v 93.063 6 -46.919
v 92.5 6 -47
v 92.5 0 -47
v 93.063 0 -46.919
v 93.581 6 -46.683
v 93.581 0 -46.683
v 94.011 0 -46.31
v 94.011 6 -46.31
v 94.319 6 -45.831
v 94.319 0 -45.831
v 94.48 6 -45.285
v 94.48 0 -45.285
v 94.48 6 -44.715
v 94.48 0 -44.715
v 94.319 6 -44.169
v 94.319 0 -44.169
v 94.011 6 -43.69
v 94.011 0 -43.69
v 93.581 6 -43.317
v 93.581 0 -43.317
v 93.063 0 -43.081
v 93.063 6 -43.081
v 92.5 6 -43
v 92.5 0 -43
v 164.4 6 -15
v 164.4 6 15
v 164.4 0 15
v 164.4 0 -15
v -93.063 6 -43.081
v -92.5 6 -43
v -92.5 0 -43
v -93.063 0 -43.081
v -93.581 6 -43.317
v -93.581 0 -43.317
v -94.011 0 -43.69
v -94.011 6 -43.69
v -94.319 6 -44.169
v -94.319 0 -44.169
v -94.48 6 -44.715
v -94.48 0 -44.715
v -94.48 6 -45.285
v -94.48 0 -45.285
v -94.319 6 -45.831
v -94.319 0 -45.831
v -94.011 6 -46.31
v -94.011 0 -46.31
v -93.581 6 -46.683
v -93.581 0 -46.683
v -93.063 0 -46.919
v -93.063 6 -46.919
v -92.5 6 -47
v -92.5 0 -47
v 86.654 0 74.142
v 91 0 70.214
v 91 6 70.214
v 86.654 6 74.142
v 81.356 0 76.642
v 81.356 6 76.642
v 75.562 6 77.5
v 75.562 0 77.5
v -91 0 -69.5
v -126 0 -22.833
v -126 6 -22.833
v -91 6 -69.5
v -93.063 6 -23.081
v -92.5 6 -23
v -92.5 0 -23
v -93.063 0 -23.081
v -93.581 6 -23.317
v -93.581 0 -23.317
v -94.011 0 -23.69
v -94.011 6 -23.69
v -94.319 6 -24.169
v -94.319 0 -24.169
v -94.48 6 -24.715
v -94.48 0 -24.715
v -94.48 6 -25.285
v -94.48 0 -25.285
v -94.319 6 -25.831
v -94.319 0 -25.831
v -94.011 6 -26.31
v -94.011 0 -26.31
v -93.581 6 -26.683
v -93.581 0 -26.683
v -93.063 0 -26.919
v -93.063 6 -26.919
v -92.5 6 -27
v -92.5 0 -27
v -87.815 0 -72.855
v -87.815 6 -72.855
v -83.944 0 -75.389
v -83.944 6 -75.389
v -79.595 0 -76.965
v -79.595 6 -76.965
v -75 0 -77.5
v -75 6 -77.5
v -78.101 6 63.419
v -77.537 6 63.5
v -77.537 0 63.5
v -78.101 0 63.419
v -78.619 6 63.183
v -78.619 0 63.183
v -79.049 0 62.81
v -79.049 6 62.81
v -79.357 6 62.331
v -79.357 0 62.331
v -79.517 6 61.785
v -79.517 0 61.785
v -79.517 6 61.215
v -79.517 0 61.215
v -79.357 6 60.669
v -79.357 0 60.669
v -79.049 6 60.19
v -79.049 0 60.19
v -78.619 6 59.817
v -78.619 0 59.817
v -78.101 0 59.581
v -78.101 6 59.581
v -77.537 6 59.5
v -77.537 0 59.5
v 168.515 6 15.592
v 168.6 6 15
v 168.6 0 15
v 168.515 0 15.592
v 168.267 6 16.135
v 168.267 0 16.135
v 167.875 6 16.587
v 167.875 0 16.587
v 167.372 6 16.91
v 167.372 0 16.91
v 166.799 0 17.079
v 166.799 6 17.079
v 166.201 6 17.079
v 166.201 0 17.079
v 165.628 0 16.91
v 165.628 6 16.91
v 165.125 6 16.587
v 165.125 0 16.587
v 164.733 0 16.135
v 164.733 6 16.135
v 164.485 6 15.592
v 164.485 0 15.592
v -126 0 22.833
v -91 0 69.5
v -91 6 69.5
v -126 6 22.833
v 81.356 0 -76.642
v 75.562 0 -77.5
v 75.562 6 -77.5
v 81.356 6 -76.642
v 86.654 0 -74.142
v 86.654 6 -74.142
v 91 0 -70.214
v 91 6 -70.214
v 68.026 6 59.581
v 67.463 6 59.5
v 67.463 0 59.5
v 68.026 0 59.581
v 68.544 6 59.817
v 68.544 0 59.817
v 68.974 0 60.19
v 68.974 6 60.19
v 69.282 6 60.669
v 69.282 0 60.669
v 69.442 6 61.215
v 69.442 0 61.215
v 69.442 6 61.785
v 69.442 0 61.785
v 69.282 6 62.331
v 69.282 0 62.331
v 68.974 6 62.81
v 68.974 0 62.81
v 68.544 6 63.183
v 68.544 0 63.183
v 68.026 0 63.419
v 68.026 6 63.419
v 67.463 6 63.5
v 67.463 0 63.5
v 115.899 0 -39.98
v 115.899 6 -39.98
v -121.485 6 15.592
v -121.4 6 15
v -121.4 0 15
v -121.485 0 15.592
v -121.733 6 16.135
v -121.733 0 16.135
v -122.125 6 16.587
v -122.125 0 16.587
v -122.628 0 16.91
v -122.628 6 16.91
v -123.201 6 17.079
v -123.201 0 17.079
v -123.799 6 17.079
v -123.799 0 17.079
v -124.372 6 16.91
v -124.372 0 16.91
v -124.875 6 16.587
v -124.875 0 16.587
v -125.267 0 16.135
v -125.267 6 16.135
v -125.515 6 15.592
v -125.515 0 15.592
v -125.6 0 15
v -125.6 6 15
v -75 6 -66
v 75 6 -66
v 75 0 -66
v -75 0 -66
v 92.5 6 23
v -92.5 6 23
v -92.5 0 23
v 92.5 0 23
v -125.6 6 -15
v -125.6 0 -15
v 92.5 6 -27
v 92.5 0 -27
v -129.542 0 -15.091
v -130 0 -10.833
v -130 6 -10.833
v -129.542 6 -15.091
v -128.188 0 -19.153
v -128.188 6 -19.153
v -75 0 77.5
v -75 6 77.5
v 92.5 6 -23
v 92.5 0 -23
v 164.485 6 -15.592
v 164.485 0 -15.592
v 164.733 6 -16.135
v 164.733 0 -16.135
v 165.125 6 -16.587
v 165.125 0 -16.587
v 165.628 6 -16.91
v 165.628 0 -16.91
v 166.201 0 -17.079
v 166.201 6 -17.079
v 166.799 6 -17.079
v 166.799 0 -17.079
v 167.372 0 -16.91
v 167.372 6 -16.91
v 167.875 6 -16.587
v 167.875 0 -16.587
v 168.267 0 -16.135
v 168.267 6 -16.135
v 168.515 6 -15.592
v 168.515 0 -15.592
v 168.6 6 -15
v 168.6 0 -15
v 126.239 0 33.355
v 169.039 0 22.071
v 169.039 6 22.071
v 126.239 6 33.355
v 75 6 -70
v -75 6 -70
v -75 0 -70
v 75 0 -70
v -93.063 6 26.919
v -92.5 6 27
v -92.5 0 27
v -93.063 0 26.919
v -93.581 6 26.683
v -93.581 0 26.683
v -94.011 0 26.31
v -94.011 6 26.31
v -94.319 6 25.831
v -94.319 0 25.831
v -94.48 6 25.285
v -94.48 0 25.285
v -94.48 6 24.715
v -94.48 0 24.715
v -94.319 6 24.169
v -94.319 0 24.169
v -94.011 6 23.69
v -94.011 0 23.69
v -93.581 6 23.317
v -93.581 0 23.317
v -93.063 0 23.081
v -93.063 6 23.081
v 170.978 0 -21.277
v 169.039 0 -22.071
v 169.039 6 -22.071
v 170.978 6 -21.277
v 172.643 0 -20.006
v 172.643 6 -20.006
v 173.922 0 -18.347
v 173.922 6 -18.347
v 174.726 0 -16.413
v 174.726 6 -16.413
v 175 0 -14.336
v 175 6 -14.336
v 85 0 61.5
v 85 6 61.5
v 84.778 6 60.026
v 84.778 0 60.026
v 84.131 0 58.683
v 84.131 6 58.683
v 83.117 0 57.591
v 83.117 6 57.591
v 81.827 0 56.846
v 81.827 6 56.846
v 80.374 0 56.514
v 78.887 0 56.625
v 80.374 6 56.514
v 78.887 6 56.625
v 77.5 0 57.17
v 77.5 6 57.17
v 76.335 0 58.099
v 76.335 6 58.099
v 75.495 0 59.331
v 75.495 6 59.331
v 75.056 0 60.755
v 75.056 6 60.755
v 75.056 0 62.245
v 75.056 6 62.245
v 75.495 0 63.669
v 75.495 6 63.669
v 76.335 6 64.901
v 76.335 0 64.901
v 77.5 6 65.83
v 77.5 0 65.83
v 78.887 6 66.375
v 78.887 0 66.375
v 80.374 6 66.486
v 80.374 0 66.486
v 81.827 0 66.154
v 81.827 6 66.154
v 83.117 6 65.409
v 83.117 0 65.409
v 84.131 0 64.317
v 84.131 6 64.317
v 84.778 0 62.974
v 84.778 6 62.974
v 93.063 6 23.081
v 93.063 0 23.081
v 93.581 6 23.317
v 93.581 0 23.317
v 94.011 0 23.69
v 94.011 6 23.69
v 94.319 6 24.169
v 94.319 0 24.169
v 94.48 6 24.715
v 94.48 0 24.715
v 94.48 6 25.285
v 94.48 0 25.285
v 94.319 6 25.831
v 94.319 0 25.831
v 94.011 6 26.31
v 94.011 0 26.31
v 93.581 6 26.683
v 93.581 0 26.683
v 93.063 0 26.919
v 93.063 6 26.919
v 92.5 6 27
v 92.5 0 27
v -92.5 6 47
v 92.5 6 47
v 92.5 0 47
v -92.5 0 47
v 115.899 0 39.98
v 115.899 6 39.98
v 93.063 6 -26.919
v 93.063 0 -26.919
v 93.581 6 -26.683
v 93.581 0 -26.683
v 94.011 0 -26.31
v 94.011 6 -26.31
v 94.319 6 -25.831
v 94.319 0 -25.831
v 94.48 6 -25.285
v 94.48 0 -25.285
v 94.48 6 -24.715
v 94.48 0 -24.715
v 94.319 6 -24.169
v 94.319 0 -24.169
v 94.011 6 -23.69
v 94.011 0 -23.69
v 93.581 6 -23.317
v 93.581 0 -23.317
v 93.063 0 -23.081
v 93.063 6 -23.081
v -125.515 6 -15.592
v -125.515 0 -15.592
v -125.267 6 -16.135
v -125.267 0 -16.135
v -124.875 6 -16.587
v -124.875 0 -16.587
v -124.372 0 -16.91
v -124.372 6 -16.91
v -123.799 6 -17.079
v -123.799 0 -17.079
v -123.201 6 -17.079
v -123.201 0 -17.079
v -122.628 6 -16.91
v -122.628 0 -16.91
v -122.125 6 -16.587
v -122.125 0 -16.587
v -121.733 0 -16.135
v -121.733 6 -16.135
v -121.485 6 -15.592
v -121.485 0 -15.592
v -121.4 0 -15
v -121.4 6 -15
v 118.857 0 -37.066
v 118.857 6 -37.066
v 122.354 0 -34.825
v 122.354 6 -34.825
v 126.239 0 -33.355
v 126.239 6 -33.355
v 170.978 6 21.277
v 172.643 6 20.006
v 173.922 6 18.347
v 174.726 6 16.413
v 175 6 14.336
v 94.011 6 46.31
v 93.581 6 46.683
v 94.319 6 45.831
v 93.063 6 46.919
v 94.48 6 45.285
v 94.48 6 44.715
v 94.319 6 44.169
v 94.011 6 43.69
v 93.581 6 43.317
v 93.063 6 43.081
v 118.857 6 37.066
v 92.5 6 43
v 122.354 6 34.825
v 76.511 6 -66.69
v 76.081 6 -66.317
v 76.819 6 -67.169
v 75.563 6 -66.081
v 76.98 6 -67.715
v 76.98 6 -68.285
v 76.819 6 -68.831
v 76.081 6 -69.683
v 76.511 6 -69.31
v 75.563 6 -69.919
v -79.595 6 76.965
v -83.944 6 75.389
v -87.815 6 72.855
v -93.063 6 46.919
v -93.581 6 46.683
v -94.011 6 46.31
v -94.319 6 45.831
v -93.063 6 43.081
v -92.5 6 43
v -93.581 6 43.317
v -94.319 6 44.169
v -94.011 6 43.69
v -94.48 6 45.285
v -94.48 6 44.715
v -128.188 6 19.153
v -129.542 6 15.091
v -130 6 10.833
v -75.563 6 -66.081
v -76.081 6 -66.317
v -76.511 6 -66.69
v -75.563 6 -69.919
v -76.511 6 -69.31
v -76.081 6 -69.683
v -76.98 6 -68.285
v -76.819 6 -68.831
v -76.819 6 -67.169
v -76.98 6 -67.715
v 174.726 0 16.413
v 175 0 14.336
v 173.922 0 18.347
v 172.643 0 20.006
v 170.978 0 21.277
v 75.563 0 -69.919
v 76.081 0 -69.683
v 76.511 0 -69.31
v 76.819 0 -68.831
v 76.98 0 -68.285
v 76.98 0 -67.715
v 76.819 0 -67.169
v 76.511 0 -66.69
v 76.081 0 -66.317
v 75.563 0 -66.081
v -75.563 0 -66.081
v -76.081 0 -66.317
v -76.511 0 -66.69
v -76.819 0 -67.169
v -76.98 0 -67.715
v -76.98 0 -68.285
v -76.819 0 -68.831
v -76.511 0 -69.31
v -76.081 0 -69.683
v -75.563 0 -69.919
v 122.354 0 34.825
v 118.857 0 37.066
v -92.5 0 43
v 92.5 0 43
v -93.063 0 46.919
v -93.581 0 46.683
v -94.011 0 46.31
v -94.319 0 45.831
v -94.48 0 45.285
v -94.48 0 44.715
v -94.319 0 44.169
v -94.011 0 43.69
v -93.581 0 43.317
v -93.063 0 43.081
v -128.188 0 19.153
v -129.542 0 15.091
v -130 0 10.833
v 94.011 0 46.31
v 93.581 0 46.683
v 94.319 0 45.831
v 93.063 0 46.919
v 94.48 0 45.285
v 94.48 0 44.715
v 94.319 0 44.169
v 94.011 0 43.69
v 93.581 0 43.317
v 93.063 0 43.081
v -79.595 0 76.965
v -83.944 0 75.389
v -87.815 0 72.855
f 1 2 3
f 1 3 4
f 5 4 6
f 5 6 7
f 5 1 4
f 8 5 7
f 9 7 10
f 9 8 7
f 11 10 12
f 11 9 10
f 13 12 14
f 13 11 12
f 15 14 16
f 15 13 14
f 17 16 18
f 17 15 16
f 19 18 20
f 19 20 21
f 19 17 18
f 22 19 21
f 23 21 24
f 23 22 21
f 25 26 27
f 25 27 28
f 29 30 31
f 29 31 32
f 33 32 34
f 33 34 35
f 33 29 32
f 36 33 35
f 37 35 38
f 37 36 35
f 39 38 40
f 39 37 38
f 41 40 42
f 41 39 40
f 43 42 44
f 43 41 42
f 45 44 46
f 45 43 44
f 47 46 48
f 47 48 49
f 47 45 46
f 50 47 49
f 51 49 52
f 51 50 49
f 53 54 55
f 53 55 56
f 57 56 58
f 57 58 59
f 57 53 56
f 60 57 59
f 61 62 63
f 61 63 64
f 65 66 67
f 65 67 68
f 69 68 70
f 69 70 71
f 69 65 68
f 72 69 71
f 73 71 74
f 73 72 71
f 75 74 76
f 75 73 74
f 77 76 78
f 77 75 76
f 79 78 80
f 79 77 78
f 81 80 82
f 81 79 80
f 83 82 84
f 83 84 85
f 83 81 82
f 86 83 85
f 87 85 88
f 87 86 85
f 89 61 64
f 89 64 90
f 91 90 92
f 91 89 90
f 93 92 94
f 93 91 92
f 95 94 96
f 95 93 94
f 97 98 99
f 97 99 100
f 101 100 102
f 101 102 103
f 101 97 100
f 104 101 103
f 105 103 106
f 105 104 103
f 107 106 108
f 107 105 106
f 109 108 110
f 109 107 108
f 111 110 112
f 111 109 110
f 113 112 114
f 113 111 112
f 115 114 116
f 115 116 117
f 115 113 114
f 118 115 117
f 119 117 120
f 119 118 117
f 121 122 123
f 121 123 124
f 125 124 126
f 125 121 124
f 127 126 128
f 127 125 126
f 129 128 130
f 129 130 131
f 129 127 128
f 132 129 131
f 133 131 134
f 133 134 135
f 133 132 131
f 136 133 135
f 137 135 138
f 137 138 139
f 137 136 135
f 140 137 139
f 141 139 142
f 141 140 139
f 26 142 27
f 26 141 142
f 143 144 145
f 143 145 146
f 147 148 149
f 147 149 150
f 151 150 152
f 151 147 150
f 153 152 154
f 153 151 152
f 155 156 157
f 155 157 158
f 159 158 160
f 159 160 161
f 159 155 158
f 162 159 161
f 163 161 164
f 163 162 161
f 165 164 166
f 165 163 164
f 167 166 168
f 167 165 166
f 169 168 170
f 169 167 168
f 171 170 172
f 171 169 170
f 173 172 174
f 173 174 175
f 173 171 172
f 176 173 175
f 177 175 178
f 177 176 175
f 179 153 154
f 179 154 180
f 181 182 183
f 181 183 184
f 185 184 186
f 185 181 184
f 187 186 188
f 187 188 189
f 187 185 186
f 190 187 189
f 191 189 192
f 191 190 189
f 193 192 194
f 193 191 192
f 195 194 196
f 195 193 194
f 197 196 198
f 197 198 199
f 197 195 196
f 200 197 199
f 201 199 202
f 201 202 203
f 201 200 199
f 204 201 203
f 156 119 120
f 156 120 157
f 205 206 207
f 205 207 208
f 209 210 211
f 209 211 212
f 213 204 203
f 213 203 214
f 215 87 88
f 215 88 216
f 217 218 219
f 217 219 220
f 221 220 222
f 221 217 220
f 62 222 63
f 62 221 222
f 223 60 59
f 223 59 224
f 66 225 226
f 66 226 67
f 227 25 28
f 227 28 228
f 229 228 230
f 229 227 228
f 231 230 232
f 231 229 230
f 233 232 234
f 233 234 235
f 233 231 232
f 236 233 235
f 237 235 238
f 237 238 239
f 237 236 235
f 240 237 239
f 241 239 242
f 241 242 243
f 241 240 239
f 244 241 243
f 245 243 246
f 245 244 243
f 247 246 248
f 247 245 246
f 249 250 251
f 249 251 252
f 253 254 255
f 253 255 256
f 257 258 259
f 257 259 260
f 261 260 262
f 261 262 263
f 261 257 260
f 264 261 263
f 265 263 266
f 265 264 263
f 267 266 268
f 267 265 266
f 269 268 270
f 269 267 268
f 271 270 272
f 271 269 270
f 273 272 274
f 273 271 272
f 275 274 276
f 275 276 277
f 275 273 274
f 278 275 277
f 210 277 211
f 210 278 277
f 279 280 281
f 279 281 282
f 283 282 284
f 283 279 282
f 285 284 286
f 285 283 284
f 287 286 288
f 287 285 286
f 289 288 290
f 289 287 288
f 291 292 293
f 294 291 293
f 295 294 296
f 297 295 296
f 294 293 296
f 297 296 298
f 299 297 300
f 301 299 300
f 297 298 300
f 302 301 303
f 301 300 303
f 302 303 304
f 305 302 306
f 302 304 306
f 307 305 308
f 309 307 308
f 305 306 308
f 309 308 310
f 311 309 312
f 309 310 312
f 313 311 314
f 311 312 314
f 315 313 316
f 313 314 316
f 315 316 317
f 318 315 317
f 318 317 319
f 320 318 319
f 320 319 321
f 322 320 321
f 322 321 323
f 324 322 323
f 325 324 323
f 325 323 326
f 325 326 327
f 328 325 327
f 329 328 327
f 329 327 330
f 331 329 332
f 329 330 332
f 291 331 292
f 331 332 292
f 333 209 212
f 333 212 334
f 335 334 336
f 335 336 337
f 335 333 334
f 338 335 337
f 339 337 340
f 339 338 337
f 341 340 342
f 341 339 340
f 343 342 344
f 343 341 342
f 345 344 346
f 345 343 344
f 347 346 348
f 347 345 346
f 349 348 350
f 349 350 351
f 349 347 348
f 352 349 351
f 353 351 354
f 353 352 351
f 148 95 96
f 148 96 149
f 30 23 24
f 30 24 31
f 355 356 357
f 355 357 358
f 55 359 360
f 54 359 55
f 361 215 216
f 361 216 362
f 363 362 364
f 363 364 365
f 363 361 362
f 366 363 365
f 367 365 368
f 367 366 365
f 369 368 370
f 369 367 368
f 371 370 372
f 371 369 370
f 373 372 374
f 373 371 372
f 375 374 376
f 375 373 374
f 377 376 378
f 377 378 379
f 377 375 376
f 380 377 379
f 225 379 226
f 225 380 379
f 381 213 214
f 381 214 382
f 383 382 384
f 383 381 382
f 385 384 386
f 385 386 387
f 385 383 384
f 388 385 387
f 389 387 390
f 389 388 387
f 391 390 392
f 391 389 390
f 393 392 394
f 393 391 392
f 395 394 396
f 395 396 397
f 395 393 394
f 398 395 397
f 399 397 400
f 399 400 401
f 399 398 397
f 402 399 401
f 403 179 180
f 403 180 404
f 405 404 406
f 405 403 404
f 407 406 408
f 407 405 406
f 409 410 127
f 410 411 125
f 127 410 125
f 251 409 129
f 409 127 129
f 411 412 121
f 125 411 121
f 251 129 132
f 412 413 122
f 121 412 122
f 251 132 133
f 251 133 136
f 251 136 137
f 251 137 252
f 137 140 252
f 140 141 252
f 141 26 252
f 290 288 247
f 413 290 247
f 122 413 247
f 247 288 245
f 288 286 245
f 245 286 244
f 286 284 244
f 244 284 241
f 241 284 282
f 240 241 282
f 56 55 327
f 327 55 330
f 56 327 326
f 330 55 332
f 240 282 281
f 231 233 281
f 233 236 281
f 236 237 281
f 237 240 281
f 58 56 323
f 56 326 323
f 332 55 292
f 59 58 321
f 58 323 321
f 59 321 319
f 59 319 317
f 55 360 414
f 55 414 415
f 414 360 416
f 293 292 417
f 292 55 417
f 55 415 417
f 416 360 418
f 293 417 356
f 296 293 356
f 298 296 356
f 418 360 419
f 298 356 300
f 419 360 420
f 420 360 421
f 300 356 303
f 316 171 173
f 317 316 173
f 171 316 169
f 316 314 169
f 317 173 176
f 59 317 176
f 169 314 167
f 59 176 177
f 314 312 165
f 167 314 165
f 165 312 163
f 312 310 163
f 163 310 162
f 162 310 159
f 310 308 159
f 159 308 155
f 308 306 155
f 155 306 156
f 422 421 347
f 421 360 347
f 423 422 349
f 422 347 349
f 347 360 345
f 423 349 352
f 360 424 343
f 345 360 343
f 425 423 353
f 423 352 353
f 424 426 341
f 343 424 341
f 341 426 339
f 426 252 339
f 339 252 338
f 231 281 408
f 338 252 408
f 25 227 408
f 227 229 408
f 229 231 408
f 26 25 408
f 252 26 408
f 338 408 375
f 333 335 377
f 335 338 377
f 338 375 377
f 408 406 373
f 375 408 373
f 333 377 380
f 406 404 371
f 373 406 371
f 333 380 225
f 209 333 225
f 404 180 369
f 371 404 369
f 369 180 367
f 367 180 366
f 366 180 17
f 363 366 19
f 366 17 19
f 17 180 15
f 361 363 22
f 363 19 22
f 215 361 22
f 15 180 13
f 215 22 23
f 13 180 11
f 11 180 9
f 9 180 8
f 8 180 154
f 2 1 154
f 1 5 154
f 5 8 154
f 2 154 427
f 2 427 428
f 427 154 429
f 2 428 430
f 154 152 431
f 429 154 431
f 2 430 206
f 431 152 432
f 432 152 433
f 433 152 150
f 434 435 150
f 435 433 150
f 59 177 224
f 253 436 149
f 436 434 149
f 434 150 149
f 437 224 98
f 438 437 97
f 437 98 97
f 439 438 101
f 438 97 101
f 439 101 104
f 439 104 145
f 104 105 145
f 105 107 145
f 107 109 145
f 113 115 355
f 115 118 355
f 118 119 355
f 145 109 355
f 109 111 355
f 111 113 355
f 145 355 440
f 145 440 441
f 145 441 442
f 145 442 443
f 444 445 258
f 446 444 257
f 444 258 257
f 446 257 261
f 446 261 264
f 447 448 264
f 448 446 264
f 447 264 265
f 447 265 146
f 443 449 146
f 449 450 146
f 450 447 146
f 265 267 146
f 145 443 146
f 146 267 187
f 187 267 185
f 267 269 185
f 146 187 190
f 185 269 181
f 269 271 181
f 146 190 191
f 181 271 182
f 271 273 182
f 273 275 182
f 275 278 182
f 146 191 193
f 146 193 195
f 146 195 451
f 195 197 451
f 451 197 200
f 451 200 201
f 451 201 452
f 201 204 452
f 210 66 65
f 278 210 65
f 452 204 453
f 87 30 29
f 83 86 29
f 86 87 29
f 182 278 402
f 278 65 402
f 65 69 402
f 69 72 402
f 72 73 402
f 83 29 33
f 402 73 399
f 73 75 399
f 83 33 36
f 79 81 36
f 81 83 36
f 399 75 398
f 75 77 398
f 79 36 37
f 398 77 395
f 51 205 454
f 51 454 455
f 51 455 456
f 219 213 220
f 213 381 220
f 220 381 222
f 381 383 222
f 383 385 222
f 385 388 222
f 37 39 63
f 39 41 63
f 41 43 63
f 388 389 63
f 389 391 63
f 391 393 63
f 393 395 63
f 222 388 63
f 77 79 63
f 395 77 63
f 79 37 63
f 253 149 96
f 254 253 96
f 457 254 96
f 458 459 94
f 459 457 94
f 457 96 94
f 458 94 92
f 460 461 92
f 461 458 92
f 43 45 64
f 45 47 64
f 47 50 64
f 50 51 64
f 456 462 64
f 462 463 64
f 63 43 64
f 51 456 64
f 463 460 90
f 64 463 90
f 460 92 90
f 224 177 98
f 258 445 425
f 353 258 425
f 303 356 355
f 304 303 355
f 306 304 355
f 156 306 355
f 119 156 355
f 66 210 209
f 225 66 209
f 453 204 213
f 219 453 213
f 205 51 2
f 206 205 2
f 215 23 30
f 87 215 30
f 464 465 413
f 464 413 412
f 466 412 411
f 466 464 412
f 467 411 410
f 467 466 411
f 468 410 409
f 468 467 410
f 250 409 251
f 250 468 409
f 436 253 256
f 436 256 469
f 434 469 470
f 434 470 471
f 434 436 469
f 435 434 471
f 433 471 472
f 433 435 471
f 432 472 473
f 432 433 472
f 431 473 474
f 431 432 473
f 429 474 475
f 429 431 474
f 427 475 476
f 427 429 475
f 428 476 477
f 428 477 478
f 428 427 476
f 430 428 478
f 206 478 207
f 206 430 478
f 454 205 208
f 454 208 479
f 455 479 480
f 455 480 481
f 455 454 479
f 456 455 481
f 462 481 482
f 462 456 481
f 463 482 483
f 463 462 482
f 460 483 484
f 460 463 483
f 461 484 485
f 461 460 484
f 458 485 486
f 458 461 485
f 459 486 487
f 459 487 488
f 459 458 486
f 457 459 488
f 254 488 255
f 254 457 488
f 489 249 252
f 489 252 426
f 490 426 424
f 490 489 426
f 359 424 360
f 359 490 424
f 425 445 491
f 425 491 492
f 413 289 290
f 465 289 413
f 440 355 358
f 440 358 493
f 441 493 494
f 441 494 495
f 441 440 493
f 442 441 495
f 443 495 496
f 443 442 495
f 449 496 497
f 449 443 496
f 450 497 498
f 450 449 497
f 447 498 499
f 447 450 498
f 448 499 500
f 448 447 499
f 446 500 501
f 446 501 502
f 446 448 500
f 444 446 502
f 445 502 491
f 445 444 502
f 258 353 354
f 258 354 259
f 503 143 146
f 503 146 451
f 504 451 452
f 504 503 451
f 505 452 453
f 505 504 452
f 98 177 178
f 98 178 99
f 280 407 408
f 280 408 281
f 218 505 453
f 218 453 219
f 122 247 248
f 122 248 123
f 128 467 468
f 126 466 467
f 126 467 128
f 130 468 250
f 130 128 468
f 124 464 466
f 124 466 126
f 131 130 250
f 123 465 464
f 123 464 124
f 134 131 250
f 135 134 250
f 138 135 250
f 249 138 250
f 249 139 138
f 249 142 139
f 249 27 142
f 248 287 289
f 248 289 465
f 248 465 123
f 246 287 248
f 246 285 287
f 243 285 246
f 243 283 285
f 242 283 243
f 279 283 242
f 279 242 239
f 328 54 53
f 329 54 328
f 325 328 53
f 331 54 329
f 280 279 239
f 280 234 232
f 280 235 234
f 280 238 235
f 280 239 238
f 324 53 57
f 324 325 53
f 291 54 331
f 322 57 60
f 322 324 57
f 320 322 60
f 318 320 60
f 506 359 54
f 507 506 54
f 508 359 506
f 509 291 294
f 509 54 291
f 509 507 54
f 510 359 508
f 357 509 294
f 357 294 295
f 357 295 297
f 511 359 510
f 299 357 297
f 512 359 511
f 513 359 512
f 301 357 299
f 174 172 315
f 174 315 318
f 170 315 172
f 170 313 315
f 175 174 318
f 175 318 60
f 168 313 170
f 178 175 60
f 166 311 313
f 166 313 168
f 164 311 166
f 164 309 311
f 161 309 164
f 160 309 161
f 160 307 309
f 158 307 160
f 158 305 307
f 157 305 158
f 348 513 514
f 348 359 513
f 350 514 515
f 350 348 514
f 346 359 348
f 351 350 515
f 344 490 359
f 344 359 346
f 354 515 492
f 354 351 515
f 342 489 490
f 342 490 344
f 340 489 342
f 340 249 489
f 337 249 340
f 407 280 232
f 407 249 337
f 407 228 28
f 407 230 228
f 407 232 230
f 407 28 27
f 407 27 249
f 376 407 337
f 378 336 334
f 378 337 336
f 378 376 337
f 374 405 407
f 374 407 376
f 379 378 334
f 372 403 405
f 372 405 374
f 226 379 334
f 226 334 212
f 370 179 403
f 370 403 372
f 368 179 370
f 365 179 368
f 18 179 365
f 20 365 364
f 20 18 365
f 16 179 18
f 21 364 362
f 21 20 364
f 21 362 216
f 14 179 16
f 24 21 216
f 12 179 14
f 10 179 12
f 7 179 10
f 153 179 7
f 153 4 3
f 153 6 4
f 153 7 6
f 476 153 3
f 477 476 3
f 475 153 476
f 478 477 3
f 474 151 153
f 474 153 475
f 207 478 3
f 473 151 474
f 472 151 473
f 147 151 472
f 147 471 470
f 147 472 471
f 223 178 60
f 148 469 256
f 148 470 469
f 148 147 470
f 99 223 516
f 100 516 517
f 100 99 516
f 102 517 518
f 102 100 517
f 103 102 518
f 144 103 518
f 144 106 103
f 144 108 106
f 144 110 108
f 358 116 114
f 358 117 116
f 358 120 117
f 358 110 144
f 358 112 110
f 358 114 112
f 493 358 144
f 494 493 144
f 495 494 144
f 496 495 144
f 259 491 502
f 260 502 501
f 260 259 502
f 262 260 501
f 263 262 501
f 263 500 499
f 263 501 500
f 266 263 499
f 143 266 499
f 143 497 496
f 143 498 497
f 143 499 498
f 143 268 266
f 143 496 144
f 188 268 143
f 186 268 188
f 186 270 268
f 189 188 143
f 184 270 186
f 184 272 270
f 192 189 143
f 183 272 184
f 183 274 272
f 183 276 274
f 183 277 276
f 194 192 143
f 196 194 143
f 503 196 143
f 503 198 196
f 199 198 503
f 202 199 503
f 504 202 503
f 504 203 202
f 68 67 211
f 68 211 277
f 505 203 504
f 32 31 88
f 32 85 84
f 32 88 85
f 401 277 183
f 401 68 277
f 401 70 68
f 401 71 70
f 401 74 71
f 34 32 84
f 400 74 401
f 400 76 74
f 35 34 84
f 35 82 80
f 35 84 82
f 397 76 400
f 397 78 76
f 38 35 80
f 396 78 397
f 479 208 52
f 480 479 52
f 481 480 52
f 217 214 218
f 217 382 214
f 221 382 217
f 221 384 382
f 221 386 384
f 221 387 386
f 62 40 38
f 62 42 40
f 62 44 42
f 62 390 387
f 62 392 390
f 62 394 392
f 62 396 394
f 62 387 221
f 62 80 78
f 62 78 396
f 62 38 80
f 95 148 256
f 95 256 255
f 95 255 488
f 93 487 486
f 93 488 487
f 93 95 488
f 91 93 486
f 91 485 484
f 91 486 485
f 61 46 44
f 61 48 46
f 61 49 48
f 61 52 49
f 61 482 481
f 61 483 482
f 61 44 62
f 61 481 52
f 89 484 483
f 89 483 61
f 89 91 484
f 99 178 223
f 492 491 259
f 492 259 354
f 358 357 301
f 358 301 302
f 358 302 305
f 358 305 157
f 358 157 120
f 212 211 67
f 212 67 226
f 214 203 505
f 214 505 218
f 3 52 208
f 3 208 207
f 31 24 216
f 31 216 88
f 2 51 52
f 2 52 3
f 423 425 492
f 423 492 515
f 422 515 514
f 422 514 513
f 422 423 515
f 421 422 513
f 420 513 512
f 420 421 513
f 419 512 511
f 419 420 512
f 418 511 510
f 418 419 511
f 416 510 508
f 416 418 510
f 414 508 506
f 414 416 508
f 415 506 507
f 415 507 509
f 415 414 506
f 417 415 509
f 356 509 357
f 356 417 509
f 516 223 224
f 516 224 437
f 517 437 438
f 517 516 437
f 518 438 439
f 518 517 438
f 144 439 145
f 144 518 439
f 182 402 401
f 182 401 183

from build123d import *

# Parameters (mm, degrees)
BOSS_EXTRUDE2_DEPTH = 6
SKETCH2_R           = 5
CUT_EXTRUDE2_DEPTH  = 6


with BuildPart() as part:
    # Sketch1 → Boss-Extrude2 (new body)
    with BuildSketch(Plane(origin=(0, 0, 0), x_dir=(1, 0, 0), z_dir=(0, 1, 0))):
        with BuildLine():
            Line((-91, -69.5), (-126, -22.833333333))
            ThreePointArc((-126, -22.833333333), (-128.973665961, -17.157888654), (-130, -10.833333333))
            Line((-130, -10.833333333), (-130, 10.833333333))
            ThreePointArc((-130, 10.833333333), (-128.973665961, 17.157888654), (-126, 22.833333333))
            Line((-126, 22.833333333), (-91, 69.5))
            ThreePointArc((-91, 69.5), (-83.94427191, 75.38854382), (-75, 77.5))
            Line((-75, 77.5), (75.561511123, 77.5))
            ThreePointArc((75.561511123, 77.5), (84.097233086, 75.587052014), (91.000115835, 70.214145057))
            Line((91.000115835, 70.214145057), (115.898546704, 39.980336145))
            ThreePointArc((115.898546704, 39.980336145), (120.54751552, 35.854535916), (126.238632031, 33.355269737))
            Line((126.238632031, 33.355269737), (169.039407754, 22.071428865))
            ThreePointArc((169.039407754, 22.071428865), (173.337004893, 19.218609112), (175, 14.335744279))
            Line((175, 14.335744279), (175, -14.335744279))
            ThreePointArc((175, -14.335744279), (173.337004893, -19.218609112), (169.039407754, -22.071428865))
            Line((169.039407754, -22.071428865), (126.238632031, -33.355269737))
            ThreePointArc((126.238632031, -33.355269737), (120.54751552, -35.854535916), (115.898546704, -39.980336145))
            Line((115.898546704, -39.980336145), (91.000115835, -70.214145057))
            ThreePointArc((91.000115835, -70.214145057), (84.097233086, -75.587052014), (75.561511123, -77.5))
            Line((75.561511123, -77.5), (-75, -77.5))
            ThreePointArc((-75, -77.5), (-83.94427191, -75.38854382), (-91, -69.5))
        make_face()
    extrude(amount=BOSS_EXTRUDE2_DEPTH)

    # Sketch2 → Cut-Extrude2 (cut)
    with BuildSketch(Plane(origin=(0, 6, 0), x_dir=(1, 0, 0), z_dir=(0, 1, 0))):
        with Locations((80, -61.5)):
            Circle(SKETCH2_R)
        with BuildLine():
            Line((168.6, 15), (168.6, -15))
            ThreePointArc((168.6, -15), (166.5, -17.1), (164.4, -15))
            Line((164.4, -15), (164.4, 15))
            ThreePointArc((164.4, 15), (166.5, 17.1), (168.6, 15))
        make_face()
        with BuildLine():
            Line((-121.4, 15), (-121.4, -15))
            ThreePointArc((-121.4, -15), (-123.5, -17.1), (-125.6, -15))
            Line((-125.6, -15), (-125.6, 15))
            ThreePointArc((-125.6, 15), (-123.5, 17.1), (-121.4, 15))
        make_face()
        with BuildLine():
            Line((-92.5, 47), (92.5, 47))
            ThreePointArc((92.5, 47), (94.5, 45), (92.5, 43))
            Line((92.5, 43), (-92.5, 43))
            ThreePointArc((-92.5, 43), (-94.5, 45), (-92.5, 47))
        make_face()
        with BuildLine():
            Line((-92.5, -43), (92.5, -43))
            ThreePointArc((92.5, -43), (94.5, -45), (92.5, -47))
            Line((92.5, -47), (-92.5, -47))
            ThreePointArc((-92.5, -47), (-94.5, -45), (-92.5, -43))
        make_face()
        with BuildLine():
            Line((-92.5, 27), (92.5, 27))
            ThreePointArc((92.5, 27), (94.5, 25), (92.5, 23))
            Line((92.5, 23), (-92.5, 23))
            ThreePointArc((-92.5, 23), (-94.5, 25), (-92.5, 27))
        make_face()
        with BuildLine():
            Line((-92.5, -23), (92.5, -23))
            ThreePointArc((92.5, -23), (94.5, -25), (92.5, -27))
            Line((92.5, -27), (-92.5, -27))
            ThreePointArc((-92.5, -27), (-94.5, -25), (-92.5, -23))
        make_face()
        with BuildLine():
            Line((-75, 70), (75, 70))
            ThreePointArc((75, 70), (77, 68), (75, 66))
            Line((75, 66), (-75, 66))
            ThreePointArc((-75, 66), (-77, 68), (-75, 70))
        make_face()
        with BuildLine():
            Line((-77.53734134, -59.5), (67.46265866, -59.5))
            ThreePointArc((67.46265866, -59.5), (69.46265866, -61.5), (67.46265866, -63.5))
            Line((67.46265866, -63.5), (-77.53734134, -63.5))
            ThreePointArc((-77.53734134, -63.5), (-79.53734134, -61.5), (-77.53734134, -59.5))
        make_face()
    extrude(amount=-CUT_EXTRUDE2_DEPTH, mode=Mode.SUBTRACT)


solid = part.part
